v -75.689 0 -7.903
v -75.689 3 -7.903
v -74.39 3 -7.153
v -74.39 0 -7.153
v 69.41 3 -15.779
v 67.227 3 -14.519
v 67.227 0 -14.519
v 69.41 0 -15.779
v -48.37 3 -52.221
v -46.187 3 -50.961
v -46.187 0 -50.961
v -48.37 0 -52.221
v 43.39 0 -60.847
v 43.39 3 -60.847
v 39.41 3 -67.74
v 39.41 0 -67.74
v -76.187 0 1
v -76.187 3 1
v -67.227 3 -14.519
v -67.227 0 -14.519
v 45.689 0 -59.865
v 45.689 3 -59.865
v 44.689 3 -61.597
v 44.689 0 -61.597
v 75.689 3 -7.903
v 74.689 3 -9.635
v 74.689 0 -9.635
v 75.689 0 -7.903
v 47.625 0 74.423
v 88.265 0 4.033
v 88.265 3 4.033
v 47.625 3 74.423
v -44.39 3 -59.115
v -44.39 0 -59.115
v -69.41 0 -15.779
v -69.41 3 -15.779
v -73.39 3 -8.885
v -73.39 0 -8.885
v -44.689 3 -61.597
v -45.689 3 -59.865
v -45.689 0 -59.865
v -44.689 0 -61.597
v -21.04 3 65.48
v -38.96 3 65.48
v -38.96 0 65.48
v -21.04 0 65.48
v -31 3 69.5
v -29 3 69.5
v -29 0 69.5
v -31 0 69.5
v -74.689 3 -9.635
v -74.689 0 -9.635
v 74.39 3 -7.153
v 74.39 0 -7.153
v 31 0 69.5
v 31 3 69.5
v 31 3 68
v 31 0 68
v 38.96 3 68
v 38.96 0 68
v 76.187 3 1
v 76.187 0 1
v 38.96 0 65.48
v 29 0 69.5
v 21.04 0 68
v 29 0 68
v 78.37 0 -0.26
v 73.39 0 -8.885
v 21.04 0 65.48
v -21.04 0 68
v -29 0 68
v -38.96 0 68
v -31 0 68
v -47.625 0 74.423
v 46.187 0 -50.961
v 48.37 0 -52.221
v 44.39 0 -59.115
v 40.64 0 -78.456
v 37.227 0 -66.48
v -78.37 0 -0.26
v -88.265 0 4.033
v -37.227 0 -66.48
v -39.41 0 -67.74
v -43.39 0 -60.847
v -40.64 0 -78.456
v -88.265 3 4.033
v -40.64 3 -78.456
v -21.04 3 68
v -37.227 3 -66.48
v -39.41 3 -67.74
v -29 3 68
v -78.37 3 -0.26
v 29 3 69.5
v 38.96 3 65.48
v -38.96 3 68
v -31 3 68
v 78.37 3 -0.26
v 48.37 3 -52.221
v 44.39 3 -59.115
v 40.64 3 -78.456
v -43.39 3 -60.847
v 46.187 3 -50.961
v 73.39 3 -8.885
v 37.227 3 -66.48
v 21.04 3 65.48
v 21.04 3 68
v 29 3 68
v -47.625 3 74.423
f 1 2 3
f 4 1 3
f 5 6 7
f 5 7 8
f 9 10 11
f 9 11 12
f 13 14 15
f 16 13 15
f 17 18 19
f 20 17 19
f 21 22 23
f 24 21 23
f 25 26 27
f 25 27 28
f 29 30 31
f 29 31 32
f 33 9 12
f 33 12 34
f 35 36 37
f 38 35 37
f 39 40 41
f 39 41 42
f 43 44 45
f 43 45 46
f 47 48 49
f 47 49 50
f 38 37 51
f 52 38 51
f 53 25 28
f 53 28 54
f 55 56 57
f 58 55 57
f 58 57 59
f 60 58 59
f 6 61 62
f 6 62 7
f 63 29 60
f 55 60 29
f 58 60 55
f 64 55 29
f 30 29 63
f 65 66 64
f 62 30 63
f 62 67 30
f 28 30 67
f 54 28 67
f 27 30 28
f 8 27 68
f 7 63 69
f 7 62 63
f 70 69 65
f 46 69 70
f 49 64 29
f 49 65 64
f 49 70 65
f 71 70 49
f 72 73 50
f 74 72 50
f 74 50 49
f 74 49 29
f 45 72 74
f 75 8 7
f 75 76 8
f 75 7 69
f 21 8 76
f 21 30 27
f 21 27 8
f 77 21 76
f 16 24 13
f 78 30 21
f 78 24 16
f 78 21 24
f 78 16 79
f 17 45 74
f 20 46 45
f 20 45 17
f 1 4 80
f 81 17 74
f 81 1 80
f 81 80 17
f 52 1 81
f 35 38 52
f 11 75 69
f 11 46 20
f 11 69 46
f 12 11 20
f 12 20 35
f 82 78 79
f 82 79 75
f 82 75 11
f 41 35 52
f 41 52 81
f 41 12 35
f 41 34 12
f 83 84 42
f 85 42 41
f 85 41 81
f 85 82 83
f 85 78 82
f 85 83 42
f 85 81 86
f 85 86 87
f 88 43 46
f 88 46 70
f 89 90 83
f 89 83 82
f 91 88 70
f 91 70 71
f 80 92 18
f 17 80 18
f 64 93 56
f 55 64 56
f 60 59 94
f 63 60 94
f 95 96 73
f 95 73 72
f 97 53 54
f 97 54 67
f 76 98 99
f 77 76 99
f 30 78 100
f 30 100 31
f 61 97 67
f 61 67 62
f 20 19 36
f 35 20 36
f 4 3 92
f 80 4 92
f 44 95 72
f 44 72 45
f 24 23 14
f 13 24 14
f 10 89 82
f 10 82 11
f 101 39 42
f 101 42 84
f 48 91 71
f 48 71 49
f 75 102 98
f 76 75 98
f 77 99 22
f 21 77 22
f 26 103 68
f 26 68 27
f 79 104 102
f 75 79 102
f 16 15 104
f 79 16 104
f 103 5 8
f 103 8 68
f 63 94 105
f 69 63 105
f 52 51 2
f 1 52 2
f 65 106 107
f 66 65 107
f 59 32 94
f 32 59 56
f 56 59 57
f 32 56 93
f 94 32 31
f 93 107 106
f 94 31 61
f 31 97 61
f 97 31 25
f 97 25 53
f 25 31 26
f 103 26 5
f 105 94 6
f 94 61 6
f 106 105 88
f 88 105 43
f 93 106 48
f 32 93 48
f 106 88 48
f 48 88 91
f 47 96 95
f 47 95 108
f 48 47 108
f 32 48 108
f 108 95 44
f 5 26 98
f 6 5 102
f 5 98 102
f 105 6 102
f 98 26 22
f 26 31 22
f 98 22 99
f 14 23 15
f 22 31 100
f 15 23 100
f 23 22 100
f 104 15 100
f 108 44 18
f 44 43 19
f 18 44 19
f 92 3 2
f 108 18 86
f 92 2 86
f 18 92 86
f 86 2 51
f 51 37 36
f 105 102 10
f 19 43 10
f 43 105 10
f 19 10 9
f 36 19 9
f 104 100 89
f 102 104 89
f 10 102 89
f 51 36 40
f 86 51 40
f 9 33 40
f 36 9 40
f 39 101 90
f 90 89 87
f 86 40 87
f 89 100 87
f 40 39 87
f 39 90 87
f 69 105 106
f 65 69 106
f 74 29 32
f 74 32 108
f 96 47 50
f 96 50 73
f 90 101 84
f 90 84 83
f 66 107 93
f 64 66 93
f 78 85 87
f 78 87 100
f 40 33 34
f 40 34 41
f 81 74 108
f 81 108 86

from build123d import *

# Parameters (mm, degrees)
BOSS_EXTRUDE1_DEPTH      = 3
CUT_EXTRUDE1_DEPTH       = 119.131597452
CIRPATTERN1_COUNT        = 3
CIRPATTERN1_COPY_1_DEPTH = 119.131597452
CIRPATTERN1_COPY_2_DEPTH = 119.131597452


with BuildPart() as part:
    # Sketch1 → Boss-Extrude1 (new body)
    with BuildSketch(Plane(origin=(0, 0, 0), x_dir=(1, 0, 0), z_dir=(0, 1, 0))):
        Polygon((-40.640000094, 78.456128134), (40.639999906, 78.456128134), (88.265000282, -4.032791576), (47.624999812, -74.423336558), (-47.625, -74.423336558), (-88.265000094, -4.032791576), align=None)
    extrude(amount=BOSS_EXTRUDE1_DEPTH)

    # Sketch2 → Cut-Extrude1 (cut, through all)
    with BuildSketch(Plane(origin=(0, 3, 0), x_dir=(1, 0, 0), z_dir=(0, 1, 0))):
        Polygon((29, -68), (29, -69.5), (31, -69.5), (31, -68), (38.96, -68), (38.96, -65.48), (21.04, -65.48), (21.04, -68), align=None)
    cut_extrude1 = extrude(amount=-CUT_EXTRUDE1_DEPTH, mode=Mode.SUBTRACT)

    # Mirror1: Cut-Extrude1 across plane
    add(cut_extrude1.mirror(Plane(origin=(0, 0, 0), x_dir=(0, 0, 1), z_dir=(1, 0, 0))), mode=Mode.SUBTRACT)

    # CirPattern1: Cut-Extrude1 ×3 about axis
    cirpattern1_axis = Axis((0, 0, 0), (0, 1, 0))
    for i in range(1, CIRPATTERN1_COUNT):
        add(cut_extrude1.rotate(cirpattern1_axis, i * 360 / CIRPATTERN1_COUNT), mode=Mode.SUBTRACT)

    # CirPattern1 copy 1 sketch → CirPattern1 copy 1 (cut, through all)
    with BuildSketch(Plane(origin=(0, 3, 0), x_dir=(0.4999999999999998, 0, 0.8660254037844387), z_dir=(0, 1, 0))):
        Polygon((29, 68), (29, 69.5), (31, 69.5), (31, 68), (38.96, 68), (38.96, 65.48), (21.04, 65.48), (21.04, 68), align=None)
    extrude(amount=-CIRPATTERN1_COPY_1_DEPTH, mode=Mode.SUBTRACT)

    # CirPattern1 copy 2 sketch → CirPattern1 copy 2 (cut, through all)
    with BuildSketch(Plane(origin=(0, 3, 0), x_dir=(0.5000000000000004, 0, -0.8660254037844384), z_dir=(0, 1, 0))):
        Polygon((29, 68), (29, 69.5), (31, 69.5), (31, 68), (38.96, 68), (38.96, 65.48), (21.04, 65.48), (21.04, 68), align=None)
    extrude(amount=-CIRPATTERN1_COPY_2_DEPTH, mode=Mode.SUBTRACT)


solid = part.part
